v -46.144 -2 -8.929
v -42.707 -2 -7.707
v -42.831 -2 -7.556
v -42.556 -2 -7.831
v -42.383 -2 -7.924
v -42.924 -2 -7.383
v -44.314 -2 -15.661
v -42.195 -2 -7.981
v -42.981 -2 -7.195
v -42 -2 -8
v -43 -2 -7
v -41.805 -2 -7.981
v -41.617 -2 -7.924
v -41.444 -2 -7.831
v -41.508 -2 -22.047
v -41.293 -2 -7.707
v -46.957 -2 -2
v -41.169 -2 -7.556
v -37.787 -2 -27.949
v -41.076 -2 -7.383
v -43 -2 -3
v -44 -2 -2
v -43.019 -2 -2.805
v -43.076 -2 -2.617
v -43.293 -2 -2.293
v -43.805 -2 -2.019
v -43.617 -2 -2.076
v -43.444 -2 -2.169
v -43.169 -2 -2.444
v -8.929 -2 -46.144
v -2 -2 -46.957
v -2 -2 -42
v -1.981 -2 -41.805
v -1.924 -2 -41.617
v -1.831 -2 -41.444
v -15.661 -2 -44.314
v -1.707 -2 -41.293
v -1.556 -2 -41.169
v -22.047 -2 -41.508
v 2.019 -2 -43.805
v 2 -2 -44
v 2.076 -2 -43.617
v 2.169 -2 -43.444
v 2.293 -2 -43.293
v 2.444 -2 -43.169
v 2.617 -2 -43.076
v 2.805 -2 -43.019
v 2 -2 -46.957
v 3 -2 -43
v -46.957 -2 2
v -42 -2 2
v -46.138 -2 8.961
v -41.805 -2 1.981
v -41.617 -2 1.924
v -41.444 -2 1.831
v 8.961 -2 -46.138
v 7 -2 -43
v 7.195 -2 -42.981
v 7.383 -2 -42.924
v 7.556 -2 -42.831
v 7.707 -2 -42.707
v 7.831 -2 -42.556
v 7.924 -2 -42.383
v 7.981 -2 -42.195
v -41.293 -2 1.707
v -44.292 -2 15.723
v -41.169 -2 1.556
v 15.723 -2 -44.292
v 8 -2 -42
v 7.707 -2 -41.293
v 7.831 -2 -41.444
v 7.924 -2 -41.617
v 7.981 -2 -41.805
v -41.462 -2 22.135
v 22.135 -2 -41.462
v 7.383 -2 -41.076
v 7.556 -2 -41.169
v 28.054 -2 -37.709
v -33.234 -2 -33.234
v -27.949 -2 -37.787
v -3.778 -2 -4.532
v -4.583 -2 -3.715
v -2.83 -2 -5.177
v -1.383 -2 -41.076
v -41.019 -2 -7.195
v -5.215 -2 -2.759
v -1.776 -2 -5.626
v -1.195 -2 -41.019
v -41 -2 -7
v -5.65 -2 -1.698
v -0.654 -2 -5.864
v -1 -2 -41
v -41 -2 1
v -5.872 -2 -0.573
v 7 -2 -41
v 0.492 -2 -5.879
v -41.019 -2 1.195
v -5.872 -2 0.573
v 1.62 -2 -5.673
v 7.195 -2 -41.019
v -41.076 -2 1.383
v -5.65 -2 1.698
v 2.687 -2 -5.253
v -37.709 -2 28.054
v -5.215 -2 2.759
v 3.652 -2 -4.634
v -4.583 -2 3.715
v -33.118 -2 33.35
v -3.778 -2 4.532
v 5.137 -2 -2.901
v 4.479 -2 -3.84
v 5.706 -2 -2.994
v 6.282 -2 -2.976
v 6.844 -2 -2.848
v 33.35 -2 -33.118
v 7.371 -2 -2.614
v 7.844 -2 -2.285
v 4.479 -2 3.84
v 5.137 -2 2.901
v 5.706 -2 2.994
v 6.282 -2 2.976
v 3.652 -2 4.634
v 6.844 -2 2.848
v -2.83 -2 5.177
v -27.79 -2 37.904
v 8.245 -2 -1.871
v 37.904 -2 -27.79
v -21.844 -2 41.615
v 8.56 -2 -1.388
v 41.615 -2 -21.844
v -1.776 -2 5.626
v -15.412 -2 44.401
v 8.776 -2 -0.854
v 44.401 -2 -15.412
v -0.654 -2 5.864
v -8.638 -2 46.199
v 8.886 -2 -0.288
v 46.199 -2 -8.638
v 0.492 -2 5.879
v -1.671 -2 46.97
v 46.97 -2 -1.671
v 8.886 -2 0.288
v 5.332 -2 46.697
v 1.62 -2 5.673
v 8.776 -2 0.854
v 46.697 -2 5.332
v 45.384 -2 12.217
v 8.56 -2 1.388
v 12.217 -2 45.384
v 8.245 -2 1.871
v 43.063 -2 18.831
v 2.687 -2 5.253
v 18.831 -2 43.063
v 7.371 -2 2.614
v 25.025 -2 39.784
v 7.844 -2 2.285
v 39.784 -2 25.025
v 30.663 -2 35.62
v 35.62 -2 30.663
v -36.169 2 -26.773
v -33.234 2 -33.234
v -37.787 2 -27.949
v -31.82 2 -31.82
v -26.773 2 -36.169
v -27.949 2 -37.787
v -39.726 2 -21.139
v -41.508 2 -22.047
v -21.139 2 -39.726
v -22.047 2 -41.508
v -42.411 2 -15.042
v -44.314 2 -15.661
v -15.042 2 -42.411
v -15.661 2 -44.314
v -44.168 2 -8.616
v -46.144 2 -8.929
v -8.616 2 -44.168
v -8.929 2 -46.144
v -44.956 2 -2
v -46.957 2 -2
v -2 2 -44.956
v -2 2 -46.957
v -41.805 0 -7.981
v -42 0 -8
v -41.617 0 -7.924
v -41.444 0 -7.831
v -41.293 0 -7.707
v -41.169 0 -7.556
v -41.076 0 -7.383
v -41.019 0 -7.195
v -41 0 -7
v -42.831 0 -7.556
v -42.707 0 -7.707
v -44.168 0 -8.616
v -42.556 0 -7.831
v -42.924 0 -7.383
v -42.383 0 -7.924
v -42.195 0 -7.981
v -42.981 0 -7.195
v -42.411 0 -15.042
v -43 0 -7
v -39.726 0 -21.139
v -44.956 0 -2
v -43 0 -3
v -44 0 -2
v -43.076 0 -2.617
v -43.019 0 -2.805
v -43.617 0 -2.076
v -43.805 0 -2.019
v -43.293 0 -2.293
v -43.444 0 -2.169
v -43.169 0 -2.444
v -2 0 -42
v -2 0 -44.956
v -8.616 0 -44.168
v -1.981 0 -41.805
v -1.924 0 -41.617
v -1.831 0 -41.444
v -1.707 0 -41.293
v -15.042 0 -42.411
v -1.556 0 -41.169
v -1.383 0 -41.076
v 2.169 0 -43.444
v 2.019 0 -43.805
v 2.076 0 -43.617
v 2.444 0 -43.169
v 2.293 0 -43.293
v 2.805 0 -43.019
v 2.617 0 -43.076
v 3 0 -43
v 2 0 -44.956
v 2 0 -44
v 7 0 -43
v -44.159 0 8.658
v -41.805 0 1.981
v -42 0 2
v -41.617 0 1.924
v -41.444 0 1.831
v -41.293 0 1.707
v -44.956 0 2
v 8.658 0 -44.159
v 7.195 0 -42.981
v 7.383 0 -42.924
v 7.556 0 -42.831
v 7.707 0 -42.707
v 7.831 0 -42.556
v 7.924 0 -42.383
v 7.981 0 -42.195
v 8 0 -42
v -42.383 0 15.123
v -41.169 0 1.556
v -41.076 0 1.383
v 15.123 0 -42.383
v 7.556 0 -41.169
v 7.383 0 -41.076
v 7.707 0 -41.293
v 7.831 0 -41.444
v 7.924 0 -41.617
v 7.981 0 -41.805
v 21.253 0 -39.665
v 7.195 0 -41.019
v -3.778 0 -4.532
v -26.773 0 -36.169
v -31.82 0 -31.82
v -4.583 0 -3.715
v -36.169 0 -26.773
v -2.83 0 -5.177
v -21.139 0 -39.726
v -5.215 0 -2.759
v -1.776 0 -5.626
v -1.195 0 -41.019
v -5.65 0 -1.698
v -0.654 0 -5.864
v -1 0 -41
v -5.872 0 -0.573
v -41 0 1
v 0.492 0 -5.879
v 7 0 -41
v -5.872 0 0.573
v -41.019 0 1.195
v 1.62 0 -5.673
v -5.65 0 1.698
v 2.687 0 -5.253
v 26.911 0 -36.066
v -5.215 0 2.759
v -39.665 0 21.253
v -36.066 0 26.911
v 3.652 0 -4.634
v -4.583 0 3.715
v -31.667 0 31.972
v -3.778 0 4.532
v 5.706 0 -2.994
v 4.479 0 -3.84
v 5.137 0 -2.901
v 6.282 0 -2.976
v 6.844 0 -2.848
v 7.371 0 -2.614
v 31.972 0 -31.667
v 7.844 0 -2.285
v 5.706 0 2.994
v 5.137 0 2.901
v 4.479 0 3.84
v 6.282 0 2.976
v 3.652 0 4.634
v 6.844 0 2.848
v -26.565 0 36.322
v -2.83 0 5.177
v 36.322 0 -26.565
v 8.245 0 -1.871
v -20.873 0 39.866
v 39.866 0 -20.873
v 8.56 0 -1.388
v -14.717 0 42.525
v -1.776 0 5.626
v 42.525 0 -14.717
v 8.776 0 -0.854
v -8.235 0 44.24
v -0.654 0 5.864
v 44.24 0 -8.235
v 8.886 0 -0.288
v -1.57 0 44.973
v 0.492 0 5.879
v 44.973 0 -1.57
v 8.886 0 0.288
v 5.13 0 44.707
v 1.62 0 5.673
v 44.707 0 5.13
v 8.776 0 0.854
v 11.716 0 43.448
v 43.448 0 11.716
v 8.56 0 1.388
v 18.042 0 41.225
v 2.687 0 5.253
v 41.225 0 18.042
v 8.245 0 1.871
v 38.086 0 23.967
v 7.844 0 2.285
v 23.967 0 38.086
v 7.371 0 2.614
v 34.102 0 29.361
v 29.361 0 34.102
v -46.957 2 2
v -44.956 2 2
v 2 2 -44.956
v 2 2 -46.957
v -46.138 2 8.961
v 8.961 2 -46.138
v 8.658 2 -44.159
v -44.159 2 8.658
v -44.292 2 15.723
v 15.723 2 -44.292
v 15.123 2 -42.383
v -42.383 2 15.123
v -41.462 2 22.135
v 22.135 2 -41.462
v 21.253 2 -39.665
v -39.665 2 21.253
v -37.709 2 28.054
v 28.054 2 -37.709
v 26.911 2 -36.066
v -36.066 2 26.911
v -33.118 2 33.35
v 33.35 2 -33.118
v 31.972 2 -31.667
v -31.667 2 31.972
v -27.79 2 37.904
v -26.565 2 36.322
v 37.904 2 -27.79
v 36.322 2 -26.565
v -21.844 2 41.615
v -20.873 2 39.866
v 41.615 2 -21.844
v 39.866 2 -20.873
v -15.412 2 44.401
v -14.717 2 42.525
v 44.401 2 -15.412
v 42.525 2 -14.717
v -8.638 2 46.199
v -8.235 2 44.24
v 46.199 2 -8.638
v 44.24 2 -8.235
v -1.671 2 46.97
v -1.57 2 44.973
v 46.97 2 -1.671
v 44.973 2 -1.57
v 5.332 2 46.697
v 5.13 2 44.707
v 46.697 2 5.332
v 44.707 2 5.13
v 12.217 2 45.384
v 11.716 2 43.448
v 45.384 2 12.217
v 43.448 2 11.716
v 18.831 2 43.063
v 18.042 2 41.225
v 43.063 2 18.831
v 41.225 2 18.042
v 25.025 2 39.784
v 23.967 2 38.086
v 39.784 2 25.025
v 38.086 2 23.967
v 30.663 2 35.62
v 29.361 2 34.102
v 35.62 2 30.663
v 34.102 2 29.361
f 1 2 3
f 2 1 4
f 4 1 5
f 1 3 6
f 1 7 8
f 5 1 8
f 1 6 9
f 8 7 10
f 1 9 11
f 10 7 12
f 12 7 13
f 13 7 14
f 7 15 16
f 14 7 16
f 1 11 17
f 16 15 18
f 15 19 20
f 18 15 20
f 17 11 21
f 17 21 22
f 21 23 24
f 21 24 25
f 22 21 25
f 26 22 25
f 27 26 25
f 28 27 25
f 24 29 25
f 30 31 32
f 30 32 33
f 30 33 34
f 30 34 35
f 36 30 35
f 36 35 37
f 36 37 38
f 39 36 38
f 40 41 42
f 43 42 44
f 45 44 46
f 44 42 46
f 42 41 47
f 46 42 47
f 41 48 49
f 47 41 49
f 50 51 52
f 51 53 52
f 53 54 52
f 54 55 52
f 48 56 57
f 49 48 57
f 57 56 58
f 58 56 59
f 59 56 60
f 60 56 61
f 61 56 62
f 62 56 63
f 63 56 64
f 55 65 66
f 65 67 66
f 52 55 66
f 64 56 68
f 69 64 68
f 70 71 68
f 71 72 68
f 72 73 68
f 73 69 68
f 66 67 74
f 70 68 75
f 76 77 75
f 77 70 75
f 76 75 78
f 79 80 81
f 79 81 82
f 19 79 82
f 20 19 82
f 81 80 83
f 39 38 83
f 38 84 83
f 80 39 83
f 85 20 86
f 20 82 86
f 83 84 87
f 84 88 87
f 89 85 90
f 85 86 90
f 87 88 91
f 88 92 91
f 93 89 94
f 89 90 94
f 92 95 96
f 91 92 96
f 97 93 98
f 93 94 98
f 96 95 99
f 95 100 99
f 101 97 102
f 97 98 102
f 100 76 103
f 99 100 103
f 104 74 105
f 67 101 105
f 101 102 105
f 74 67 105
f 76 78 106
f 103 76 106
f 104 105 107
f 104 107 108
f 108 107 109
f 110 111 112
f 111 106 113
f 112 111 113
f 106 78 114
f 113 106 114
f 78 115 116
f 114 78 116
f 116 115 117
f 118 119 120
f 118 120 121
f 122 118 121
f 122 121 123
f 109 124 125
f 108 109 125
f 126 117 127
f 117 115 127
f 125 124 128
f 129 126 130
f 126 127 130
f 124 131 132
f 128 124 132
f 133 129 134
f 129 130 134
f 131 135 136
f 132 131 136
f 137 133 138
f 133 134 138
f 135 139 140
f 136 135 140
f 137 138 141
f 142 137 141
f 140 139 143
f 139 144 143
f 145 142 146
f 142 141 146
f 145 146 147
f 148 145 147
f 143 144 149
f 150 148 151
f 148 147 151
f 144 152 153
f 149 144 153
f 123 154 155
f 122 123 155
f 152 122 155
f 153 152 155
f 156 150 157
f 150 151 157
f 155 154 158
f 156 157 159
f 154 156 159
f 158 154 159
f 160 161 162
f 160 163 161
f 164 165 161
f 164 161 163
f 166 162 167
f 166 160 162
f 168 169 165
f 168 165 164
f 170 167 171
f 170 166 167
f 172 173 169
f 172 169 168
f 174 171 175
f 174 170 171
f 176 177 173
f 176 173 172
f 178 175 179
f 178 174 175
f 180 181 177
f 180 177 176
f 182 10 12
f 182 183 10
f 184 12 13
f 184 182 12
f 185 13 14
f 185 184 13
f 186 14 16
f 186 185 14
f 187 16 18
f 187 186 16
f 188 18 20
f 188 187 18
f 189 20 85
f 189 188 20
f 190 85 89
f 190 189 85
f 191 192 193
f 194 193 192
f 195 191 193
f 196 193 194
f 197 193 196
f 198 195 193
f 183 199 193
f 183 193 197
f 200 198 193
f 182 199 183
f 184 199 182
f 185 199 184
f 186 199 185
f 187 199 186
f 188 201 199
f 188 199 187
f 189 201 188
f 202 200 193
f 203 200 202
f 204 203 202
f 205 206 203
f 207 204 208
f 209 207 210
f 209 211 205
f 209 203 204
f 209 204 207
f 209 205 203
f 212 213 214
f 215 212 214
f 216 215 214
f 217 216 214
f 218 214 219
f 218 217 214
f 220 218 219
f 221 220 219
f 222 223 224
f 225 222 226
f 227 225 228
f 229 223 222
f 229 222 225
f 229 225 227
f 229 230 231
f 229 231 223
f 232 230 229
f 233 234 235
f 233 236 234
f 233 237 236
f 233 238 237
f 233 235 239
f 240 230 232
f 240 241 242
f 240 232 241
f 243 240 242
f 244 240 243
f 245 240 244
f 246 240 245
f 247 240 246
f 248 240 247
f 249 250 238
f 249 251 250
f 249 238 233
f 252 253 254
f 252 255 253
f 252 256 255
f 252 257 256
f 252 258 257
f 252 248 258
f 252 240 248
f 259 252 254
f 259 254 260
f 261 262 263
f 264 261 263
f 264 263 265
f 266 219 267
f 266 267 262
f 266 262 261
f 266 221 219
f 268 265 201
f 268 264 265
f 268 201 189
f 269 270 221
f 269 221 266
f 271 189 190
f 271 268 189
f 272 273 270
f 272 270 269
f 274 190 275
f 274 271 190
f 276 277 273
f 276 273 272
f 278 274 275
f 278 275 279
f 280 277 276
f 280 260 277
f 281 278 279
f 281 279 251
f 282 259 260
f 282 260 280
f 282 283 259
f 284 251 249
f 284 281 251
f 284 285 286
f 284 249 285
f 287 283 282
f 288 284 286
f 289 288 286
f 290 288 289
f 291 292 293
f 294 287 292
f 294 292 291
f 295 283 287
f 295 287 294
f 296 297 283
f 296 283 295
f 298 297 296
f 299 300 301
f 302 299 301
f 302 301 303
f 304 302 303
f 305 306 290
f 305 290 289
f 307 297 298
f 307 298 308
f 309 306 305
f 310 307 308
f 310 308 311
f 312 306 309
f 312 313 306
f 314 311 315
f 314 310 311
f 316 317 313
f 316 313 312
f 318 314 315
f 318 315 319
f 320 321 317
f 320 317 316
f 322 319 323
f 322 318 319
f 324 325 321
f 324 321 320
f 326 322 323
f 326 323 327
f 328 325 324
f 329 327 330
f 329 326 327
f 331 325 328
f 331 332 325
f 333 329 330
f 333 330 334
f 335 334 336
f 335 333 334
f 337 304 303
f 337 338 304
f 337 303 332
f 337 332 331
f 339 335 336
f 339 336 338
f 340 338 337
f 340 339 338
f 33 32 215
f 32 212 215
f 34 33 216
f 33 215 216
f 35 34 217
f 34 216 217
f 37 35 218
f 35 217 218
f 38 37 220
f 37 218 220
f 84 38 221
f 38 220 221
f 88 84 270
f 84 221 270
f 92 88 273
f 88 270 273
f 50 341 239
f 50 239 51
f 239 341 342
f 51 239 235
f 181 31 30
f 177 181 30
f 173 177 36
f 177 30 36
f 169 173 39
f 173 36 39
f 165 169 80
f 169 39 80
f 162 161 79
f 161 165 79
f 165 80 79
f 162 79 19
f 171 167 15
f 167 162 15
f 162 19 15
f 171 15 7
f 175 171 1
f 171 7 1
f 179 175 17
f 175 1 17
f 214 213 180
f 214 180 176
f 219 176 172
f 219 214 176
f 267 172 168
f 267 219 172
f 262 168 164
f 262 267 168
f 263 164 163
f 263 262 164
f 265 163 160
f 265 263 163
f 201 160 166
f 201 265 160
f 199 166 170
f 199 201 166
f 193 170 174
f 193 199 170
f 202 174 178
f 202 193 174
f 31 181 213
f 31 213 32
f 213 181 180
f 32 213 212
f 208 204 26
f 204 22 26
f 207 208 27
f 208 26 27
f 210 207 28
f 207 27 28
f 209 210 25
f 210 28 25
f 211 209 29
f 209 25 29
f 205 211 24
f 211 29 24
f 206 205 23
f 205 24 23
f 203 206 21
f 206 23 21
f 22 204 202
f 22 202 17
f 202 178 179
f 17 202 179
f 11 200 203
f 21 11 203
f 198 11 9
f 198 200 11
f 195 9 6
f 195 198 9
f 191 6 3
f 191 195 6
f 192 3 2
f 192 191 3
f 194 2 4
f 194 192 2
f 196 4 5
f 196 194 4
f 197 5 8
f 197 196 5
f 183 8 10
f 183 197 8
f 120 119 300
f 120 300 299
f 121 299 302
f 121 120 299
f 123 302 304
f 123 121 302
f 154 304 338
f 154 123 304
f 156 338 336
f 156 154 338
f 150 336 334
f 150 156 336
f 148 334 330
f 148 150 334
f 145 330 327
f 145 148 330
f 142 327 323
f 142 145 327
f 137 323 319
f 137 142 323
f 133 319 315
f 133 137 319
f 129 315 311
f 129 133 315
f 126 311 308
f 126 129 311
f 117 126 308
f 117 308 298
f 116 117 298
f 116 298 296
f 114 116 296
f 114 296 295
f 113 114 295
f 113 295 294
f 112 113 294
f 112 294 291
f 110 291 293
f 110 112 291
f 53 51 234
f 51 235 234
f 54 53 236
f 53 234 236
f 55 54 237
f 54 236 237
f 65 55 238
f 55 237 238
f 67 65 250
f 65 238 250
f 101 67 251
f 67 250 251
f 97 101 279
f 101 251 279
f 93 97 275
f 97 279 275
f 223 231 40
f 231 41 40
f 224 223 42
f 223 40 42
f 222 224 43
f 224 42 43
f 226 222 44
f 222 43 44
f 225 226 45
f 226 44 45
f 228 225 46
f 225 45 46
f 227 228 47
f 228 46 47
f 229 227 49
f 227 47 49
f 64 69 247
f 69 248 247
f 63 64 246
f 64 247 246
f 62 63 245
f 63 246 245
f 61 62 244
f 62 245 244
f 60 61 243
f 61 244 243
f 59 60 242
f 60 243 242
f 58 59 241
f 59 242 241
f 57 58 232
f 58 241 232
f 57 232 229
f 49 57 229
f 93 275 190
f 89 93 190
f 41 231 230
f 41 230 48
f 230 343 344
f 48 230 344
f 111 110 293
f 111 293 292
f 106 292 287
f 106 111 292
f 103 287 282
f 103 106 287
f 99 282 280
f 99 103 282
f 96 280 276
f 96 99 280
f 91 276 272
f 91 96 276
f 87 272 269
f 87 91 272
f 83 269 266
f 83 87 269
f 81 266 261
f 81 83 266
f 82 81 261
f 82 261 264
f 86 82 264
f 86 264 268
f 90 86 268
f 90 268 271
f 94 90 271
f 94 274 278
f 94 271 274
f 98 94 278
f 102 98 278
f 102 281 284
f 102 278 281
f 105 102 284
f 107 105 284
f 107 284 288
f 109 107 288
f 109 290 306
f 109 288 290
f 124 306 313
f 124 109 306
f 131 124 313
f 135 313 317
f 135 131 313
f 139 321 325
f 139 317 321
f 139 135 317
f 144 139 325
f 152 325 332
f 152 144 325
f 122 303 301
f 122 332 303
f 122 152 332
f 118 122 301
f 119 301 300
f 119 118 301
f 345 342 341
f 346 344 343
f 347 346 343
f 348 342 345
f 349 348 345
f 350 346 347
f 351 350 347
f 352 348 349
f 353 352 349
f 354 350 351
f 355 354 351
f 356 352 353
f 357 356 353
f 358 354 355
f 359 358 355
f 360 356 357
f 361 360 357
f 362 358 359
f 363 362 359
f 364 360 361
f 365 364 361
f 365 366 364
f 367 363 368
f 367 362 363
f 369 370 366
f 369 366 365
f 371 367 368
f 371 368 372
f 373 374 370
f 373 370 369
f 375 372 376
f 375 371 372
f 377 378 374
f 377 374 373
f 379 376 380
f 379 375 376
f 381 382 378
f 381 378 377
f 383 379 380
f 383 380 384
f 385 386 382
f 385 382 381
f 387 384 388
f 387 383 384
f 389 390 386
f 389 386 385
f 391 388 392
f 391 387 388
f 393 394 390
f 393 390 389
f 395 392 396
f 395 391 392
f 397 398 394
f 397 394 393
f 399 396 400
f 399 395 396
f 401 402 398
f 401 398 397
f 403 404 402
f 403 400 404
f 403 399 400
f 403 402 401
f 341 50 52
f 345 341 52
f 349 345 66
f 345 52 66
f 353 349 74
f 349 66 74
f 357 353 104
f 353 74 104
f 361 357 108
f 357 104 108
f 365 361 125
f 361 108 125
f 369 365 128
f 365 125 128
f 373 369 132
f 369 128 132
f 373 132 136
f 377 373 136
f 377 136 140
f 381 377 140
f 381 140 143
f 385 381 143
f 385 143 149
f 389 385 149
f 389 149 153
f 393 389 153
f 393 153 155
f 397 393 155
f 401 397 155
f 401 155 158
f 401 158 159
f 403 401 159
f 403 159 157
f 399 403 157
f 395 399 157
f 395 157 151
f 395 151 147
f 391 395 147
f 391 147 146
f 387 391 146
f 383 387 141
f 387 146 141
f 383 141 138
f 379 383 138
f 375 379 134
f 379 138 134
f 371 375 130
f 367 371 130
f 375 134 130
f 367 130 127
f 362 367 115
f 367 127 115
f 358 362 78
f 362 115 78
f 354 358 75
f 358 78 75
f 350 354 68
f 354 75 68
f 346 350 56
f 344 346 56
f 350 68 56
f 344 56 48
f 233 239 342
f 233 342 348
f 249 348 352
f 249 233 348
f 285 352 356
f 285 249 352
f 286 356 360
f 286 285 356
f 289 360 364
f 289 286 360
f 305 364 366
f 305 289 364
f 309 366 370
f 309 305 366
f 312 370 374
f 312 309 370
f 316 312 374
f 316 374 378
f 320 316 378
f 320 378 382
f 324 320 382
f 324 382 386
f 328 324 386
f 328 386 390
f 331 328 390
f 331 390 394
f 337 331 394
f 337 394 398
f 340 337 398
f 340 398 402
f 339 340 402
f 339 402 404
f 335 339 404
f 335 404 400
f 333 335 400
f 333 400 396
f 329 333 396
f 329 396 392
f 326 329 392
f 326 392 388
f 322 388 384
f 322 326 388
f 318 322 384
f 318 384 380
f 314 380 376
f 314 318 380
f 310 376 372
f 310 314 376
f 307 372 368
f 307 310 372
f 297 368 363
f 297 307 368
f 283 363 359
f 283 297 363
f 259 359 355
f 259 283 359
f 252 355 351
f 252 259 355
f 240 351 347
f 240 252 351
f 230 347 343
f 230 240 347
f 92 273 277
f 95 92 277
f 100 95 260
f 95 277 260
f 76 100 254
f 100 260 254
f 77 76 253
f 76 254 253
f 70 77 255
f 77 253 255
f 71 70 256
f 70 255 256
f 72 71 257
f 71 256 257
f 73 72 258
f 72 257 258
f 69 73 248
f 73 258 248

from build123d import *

# Parameters (mm, degrees)
SKETCH1_R                     = 45
OUTER_DISK_DEPTH              = 2
ENCLOSEMENT_T                 = 2
HOOK_RELEASE_DEPTH            = 67.498120274
CIRPATTERN1_COUNT             = 2
CIRPATTERN1_ANGLE             = 90
SERVO_MOTOR_CUTOUT_DEPTH      = 67.498120274
SERVO_MOTOR_CUTOUT_DEPTH_BACK = 67.498120274
SKETCH3_R                     = 3
SKETCH3_R_2                   = 5.9
FILLET1_R                     = 1


with BuildPart() as part:
    # Sketch1 → Outer DIsk (new body)
    with BuildSketch(Plane(origin=(0, 0, 0), x_dir=(1, 0, 0), z_dir=(0, 1, 0))):
        with Locations(Location((0, 0, 0), (0, 0, 270))):
            Circle(SKETCH1_R)
    extrude(amount=OUTER_DISK_DEPTH)

    # Enclosement
    enclosement_openings = [part.faces().sort_by_distance(p)[0] for p in [
        (0, 2, 0),
    ]]
    offset(amount=ENCLOSEMENT_T, openings=enclosement_openings, kind=Kind.INTERSECTION)

    # Sketch2 → Hook Release (cut, symmetric)
    with BuildSketch(Plane(origin=(0, 0, 0), x_dir=(1, 0, 0), z_dir=(0, 1, 0))):
        Polygon((-2, 47), (-2, 41), (8, 41), (8, 43), (2, 43), (2, 47), align=None)
    hook_release = extrude(amount=HOOK_RELEASE_DEPTH, both=True, mode=Mode.SUBTRACT)

    # CirPattern1: Hook Release ×2 about axis
    cirpattern1_axis = Axis((0, 0, 0), (0, 1, 0))
    for i in range(1, CIRPATTERN1_COUNT):
        add(hook_release.rotate(cirpattern1_axis, i * CIRPATTERN1_ANGLE / (CIRPATTERN1_COUNT - 1)), mode=Mode.SUBTRACT)

    # Sketch3 → Servo Motor Cutout (cut, two sides: drawn at the far end of the back side and taken through both)
    with BuildSketch(Plane(origin=(0, 0, 0), x_dir=(1, 0, 0), z_dir=(0, 1, 0)).offset(-SERVO_MOTOR_CUTOUT_DEPTH_BACK)):
        with Locations((5.9, 0)):
            Circle(SKETCH3_R)
        Circle(SKETCH3_R_2)
    extrude(amount=SERVO_MOTOR_CUTOUT_DEPTH + SERVO_MOTOR_CUTOUT_DEPTH_BACK, mode=Mode.SUBTRACT)

    # Fillet1
    fillet1_edges = [part.edges().sort_by_distance(p)[0] for p in [
        (-41, -1, 2),
        (-41, -1, -8),
        (-43, -1, -8),
        (-43, -1, -2),
        (8, -1, -41),
        (-2, -1, -41),
        (8, -1, -43),
        (2, -1, -43),
    ]]
    fillet(fillet1_edges, radius=FILLET1_R - 0.0001)  # a hair under: the kernel refuses the full size


solid = part.part
